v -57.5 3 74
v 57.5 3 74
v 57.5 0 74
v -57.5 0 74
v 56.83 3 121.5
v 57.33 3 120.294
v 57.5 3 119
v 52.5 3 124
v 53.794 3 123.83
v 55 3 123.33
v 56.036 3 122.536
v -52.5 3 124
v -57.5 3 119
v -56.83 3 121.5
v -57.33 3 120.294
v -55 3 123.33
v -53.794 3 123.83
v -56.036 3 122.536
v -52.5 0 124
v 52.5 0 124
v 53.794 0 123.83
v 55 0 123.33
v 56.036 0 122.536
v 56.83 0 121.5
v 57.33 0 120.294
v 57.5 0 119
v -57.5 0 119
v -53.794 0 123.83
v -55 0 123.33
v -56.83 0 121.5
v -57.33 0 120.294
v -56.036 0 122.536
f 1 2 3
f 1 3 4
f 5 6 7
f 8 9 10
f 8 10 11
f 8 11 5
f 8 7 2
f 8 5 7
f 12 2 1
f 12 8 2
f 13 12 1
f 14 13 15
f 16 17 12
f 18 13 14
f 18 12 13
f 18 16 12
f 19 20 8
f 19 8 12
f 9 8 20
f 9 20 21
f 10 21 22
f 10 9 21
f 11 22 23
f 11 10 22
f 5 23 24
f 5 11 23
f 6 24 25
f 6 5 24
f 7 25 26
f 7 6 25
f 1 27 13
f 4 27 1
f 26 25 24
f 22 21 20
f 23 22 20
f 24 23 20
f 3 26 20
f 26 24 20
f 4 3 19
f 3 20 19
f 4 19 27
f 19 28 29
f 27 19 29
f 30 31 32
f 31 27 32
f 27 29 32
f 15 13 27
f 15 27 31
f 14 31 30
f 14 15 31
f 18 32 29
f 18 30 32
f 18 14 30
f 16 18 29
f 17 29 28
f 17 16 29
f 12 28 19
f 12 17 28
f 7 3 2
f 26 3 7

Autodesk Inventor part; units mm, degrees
ref_plane "YZ Plane" through (0, 0, 0) normal (1, 0, 0) x (0, 1, 0)
ref_plane "XZ Plane" through (0, 0, 0) normal (0, 1, 0) x (-1, 0, 0)
ref_plane "XY Plane" through (0, 0, 0) normal (0, 0, 1) x (1, 0, 0)
sketch "Sketch1" plane through (0, 0, 0) normal (0, 1, 0) x (-1, 0, 0)
  line L0 (-57.5, 124) -> (57.5, 124)
  line L1 (57.5, 124) -> (57.5, -124)
  line L2 (57.5, -124) -> (-57.5, -124)
  line L3 (-57.5, -124) -> (-57.5, 124)
  line L4 (-57.5, 124) -> (57.5, -124) construction
  line L5 (57.5, 124) -> (-57.5, -124) construction
  point P0 (0, 0)
  dimension "d0" = 248
  dimension "d1" = 115
extrude "Extrusion1" add sketch "Sketch1" along normal blind 3
fillet "Fillet1" radius 5 4 edges at (57.5, 1.5, 124) (57.5, 1.5, -124) (-57.5, 1.5, 124) (-57.5, 1.5, -124)
sketch "Sketch2" plane through (0, 3, 0) normal (0, 1, 0) x (1, 0, 0)
  line L0 (-57.5, -124) -> (57.5, -124)
  line L1 (57.5, -124) -> (57.5, -74)
  line L2 (57.5, -74) -> (-57.5, -74)
  line L3 (-57.5, -74) -> (-57.5, -124)
  line L4 (-57.5, 119) -> (-57.5, -119) projected
  line L5 (57.5, -119) -> (57.5, 119) projected
  line L6 (-52.5, -124) -> (52.5, -124) projected
  point P0 (0, 0)
  dimension "d5" = 50
extrude "Extrusion2" cut sketch "Sketch2" against normal through all keep common part
properties part number "PMMA_lid"
